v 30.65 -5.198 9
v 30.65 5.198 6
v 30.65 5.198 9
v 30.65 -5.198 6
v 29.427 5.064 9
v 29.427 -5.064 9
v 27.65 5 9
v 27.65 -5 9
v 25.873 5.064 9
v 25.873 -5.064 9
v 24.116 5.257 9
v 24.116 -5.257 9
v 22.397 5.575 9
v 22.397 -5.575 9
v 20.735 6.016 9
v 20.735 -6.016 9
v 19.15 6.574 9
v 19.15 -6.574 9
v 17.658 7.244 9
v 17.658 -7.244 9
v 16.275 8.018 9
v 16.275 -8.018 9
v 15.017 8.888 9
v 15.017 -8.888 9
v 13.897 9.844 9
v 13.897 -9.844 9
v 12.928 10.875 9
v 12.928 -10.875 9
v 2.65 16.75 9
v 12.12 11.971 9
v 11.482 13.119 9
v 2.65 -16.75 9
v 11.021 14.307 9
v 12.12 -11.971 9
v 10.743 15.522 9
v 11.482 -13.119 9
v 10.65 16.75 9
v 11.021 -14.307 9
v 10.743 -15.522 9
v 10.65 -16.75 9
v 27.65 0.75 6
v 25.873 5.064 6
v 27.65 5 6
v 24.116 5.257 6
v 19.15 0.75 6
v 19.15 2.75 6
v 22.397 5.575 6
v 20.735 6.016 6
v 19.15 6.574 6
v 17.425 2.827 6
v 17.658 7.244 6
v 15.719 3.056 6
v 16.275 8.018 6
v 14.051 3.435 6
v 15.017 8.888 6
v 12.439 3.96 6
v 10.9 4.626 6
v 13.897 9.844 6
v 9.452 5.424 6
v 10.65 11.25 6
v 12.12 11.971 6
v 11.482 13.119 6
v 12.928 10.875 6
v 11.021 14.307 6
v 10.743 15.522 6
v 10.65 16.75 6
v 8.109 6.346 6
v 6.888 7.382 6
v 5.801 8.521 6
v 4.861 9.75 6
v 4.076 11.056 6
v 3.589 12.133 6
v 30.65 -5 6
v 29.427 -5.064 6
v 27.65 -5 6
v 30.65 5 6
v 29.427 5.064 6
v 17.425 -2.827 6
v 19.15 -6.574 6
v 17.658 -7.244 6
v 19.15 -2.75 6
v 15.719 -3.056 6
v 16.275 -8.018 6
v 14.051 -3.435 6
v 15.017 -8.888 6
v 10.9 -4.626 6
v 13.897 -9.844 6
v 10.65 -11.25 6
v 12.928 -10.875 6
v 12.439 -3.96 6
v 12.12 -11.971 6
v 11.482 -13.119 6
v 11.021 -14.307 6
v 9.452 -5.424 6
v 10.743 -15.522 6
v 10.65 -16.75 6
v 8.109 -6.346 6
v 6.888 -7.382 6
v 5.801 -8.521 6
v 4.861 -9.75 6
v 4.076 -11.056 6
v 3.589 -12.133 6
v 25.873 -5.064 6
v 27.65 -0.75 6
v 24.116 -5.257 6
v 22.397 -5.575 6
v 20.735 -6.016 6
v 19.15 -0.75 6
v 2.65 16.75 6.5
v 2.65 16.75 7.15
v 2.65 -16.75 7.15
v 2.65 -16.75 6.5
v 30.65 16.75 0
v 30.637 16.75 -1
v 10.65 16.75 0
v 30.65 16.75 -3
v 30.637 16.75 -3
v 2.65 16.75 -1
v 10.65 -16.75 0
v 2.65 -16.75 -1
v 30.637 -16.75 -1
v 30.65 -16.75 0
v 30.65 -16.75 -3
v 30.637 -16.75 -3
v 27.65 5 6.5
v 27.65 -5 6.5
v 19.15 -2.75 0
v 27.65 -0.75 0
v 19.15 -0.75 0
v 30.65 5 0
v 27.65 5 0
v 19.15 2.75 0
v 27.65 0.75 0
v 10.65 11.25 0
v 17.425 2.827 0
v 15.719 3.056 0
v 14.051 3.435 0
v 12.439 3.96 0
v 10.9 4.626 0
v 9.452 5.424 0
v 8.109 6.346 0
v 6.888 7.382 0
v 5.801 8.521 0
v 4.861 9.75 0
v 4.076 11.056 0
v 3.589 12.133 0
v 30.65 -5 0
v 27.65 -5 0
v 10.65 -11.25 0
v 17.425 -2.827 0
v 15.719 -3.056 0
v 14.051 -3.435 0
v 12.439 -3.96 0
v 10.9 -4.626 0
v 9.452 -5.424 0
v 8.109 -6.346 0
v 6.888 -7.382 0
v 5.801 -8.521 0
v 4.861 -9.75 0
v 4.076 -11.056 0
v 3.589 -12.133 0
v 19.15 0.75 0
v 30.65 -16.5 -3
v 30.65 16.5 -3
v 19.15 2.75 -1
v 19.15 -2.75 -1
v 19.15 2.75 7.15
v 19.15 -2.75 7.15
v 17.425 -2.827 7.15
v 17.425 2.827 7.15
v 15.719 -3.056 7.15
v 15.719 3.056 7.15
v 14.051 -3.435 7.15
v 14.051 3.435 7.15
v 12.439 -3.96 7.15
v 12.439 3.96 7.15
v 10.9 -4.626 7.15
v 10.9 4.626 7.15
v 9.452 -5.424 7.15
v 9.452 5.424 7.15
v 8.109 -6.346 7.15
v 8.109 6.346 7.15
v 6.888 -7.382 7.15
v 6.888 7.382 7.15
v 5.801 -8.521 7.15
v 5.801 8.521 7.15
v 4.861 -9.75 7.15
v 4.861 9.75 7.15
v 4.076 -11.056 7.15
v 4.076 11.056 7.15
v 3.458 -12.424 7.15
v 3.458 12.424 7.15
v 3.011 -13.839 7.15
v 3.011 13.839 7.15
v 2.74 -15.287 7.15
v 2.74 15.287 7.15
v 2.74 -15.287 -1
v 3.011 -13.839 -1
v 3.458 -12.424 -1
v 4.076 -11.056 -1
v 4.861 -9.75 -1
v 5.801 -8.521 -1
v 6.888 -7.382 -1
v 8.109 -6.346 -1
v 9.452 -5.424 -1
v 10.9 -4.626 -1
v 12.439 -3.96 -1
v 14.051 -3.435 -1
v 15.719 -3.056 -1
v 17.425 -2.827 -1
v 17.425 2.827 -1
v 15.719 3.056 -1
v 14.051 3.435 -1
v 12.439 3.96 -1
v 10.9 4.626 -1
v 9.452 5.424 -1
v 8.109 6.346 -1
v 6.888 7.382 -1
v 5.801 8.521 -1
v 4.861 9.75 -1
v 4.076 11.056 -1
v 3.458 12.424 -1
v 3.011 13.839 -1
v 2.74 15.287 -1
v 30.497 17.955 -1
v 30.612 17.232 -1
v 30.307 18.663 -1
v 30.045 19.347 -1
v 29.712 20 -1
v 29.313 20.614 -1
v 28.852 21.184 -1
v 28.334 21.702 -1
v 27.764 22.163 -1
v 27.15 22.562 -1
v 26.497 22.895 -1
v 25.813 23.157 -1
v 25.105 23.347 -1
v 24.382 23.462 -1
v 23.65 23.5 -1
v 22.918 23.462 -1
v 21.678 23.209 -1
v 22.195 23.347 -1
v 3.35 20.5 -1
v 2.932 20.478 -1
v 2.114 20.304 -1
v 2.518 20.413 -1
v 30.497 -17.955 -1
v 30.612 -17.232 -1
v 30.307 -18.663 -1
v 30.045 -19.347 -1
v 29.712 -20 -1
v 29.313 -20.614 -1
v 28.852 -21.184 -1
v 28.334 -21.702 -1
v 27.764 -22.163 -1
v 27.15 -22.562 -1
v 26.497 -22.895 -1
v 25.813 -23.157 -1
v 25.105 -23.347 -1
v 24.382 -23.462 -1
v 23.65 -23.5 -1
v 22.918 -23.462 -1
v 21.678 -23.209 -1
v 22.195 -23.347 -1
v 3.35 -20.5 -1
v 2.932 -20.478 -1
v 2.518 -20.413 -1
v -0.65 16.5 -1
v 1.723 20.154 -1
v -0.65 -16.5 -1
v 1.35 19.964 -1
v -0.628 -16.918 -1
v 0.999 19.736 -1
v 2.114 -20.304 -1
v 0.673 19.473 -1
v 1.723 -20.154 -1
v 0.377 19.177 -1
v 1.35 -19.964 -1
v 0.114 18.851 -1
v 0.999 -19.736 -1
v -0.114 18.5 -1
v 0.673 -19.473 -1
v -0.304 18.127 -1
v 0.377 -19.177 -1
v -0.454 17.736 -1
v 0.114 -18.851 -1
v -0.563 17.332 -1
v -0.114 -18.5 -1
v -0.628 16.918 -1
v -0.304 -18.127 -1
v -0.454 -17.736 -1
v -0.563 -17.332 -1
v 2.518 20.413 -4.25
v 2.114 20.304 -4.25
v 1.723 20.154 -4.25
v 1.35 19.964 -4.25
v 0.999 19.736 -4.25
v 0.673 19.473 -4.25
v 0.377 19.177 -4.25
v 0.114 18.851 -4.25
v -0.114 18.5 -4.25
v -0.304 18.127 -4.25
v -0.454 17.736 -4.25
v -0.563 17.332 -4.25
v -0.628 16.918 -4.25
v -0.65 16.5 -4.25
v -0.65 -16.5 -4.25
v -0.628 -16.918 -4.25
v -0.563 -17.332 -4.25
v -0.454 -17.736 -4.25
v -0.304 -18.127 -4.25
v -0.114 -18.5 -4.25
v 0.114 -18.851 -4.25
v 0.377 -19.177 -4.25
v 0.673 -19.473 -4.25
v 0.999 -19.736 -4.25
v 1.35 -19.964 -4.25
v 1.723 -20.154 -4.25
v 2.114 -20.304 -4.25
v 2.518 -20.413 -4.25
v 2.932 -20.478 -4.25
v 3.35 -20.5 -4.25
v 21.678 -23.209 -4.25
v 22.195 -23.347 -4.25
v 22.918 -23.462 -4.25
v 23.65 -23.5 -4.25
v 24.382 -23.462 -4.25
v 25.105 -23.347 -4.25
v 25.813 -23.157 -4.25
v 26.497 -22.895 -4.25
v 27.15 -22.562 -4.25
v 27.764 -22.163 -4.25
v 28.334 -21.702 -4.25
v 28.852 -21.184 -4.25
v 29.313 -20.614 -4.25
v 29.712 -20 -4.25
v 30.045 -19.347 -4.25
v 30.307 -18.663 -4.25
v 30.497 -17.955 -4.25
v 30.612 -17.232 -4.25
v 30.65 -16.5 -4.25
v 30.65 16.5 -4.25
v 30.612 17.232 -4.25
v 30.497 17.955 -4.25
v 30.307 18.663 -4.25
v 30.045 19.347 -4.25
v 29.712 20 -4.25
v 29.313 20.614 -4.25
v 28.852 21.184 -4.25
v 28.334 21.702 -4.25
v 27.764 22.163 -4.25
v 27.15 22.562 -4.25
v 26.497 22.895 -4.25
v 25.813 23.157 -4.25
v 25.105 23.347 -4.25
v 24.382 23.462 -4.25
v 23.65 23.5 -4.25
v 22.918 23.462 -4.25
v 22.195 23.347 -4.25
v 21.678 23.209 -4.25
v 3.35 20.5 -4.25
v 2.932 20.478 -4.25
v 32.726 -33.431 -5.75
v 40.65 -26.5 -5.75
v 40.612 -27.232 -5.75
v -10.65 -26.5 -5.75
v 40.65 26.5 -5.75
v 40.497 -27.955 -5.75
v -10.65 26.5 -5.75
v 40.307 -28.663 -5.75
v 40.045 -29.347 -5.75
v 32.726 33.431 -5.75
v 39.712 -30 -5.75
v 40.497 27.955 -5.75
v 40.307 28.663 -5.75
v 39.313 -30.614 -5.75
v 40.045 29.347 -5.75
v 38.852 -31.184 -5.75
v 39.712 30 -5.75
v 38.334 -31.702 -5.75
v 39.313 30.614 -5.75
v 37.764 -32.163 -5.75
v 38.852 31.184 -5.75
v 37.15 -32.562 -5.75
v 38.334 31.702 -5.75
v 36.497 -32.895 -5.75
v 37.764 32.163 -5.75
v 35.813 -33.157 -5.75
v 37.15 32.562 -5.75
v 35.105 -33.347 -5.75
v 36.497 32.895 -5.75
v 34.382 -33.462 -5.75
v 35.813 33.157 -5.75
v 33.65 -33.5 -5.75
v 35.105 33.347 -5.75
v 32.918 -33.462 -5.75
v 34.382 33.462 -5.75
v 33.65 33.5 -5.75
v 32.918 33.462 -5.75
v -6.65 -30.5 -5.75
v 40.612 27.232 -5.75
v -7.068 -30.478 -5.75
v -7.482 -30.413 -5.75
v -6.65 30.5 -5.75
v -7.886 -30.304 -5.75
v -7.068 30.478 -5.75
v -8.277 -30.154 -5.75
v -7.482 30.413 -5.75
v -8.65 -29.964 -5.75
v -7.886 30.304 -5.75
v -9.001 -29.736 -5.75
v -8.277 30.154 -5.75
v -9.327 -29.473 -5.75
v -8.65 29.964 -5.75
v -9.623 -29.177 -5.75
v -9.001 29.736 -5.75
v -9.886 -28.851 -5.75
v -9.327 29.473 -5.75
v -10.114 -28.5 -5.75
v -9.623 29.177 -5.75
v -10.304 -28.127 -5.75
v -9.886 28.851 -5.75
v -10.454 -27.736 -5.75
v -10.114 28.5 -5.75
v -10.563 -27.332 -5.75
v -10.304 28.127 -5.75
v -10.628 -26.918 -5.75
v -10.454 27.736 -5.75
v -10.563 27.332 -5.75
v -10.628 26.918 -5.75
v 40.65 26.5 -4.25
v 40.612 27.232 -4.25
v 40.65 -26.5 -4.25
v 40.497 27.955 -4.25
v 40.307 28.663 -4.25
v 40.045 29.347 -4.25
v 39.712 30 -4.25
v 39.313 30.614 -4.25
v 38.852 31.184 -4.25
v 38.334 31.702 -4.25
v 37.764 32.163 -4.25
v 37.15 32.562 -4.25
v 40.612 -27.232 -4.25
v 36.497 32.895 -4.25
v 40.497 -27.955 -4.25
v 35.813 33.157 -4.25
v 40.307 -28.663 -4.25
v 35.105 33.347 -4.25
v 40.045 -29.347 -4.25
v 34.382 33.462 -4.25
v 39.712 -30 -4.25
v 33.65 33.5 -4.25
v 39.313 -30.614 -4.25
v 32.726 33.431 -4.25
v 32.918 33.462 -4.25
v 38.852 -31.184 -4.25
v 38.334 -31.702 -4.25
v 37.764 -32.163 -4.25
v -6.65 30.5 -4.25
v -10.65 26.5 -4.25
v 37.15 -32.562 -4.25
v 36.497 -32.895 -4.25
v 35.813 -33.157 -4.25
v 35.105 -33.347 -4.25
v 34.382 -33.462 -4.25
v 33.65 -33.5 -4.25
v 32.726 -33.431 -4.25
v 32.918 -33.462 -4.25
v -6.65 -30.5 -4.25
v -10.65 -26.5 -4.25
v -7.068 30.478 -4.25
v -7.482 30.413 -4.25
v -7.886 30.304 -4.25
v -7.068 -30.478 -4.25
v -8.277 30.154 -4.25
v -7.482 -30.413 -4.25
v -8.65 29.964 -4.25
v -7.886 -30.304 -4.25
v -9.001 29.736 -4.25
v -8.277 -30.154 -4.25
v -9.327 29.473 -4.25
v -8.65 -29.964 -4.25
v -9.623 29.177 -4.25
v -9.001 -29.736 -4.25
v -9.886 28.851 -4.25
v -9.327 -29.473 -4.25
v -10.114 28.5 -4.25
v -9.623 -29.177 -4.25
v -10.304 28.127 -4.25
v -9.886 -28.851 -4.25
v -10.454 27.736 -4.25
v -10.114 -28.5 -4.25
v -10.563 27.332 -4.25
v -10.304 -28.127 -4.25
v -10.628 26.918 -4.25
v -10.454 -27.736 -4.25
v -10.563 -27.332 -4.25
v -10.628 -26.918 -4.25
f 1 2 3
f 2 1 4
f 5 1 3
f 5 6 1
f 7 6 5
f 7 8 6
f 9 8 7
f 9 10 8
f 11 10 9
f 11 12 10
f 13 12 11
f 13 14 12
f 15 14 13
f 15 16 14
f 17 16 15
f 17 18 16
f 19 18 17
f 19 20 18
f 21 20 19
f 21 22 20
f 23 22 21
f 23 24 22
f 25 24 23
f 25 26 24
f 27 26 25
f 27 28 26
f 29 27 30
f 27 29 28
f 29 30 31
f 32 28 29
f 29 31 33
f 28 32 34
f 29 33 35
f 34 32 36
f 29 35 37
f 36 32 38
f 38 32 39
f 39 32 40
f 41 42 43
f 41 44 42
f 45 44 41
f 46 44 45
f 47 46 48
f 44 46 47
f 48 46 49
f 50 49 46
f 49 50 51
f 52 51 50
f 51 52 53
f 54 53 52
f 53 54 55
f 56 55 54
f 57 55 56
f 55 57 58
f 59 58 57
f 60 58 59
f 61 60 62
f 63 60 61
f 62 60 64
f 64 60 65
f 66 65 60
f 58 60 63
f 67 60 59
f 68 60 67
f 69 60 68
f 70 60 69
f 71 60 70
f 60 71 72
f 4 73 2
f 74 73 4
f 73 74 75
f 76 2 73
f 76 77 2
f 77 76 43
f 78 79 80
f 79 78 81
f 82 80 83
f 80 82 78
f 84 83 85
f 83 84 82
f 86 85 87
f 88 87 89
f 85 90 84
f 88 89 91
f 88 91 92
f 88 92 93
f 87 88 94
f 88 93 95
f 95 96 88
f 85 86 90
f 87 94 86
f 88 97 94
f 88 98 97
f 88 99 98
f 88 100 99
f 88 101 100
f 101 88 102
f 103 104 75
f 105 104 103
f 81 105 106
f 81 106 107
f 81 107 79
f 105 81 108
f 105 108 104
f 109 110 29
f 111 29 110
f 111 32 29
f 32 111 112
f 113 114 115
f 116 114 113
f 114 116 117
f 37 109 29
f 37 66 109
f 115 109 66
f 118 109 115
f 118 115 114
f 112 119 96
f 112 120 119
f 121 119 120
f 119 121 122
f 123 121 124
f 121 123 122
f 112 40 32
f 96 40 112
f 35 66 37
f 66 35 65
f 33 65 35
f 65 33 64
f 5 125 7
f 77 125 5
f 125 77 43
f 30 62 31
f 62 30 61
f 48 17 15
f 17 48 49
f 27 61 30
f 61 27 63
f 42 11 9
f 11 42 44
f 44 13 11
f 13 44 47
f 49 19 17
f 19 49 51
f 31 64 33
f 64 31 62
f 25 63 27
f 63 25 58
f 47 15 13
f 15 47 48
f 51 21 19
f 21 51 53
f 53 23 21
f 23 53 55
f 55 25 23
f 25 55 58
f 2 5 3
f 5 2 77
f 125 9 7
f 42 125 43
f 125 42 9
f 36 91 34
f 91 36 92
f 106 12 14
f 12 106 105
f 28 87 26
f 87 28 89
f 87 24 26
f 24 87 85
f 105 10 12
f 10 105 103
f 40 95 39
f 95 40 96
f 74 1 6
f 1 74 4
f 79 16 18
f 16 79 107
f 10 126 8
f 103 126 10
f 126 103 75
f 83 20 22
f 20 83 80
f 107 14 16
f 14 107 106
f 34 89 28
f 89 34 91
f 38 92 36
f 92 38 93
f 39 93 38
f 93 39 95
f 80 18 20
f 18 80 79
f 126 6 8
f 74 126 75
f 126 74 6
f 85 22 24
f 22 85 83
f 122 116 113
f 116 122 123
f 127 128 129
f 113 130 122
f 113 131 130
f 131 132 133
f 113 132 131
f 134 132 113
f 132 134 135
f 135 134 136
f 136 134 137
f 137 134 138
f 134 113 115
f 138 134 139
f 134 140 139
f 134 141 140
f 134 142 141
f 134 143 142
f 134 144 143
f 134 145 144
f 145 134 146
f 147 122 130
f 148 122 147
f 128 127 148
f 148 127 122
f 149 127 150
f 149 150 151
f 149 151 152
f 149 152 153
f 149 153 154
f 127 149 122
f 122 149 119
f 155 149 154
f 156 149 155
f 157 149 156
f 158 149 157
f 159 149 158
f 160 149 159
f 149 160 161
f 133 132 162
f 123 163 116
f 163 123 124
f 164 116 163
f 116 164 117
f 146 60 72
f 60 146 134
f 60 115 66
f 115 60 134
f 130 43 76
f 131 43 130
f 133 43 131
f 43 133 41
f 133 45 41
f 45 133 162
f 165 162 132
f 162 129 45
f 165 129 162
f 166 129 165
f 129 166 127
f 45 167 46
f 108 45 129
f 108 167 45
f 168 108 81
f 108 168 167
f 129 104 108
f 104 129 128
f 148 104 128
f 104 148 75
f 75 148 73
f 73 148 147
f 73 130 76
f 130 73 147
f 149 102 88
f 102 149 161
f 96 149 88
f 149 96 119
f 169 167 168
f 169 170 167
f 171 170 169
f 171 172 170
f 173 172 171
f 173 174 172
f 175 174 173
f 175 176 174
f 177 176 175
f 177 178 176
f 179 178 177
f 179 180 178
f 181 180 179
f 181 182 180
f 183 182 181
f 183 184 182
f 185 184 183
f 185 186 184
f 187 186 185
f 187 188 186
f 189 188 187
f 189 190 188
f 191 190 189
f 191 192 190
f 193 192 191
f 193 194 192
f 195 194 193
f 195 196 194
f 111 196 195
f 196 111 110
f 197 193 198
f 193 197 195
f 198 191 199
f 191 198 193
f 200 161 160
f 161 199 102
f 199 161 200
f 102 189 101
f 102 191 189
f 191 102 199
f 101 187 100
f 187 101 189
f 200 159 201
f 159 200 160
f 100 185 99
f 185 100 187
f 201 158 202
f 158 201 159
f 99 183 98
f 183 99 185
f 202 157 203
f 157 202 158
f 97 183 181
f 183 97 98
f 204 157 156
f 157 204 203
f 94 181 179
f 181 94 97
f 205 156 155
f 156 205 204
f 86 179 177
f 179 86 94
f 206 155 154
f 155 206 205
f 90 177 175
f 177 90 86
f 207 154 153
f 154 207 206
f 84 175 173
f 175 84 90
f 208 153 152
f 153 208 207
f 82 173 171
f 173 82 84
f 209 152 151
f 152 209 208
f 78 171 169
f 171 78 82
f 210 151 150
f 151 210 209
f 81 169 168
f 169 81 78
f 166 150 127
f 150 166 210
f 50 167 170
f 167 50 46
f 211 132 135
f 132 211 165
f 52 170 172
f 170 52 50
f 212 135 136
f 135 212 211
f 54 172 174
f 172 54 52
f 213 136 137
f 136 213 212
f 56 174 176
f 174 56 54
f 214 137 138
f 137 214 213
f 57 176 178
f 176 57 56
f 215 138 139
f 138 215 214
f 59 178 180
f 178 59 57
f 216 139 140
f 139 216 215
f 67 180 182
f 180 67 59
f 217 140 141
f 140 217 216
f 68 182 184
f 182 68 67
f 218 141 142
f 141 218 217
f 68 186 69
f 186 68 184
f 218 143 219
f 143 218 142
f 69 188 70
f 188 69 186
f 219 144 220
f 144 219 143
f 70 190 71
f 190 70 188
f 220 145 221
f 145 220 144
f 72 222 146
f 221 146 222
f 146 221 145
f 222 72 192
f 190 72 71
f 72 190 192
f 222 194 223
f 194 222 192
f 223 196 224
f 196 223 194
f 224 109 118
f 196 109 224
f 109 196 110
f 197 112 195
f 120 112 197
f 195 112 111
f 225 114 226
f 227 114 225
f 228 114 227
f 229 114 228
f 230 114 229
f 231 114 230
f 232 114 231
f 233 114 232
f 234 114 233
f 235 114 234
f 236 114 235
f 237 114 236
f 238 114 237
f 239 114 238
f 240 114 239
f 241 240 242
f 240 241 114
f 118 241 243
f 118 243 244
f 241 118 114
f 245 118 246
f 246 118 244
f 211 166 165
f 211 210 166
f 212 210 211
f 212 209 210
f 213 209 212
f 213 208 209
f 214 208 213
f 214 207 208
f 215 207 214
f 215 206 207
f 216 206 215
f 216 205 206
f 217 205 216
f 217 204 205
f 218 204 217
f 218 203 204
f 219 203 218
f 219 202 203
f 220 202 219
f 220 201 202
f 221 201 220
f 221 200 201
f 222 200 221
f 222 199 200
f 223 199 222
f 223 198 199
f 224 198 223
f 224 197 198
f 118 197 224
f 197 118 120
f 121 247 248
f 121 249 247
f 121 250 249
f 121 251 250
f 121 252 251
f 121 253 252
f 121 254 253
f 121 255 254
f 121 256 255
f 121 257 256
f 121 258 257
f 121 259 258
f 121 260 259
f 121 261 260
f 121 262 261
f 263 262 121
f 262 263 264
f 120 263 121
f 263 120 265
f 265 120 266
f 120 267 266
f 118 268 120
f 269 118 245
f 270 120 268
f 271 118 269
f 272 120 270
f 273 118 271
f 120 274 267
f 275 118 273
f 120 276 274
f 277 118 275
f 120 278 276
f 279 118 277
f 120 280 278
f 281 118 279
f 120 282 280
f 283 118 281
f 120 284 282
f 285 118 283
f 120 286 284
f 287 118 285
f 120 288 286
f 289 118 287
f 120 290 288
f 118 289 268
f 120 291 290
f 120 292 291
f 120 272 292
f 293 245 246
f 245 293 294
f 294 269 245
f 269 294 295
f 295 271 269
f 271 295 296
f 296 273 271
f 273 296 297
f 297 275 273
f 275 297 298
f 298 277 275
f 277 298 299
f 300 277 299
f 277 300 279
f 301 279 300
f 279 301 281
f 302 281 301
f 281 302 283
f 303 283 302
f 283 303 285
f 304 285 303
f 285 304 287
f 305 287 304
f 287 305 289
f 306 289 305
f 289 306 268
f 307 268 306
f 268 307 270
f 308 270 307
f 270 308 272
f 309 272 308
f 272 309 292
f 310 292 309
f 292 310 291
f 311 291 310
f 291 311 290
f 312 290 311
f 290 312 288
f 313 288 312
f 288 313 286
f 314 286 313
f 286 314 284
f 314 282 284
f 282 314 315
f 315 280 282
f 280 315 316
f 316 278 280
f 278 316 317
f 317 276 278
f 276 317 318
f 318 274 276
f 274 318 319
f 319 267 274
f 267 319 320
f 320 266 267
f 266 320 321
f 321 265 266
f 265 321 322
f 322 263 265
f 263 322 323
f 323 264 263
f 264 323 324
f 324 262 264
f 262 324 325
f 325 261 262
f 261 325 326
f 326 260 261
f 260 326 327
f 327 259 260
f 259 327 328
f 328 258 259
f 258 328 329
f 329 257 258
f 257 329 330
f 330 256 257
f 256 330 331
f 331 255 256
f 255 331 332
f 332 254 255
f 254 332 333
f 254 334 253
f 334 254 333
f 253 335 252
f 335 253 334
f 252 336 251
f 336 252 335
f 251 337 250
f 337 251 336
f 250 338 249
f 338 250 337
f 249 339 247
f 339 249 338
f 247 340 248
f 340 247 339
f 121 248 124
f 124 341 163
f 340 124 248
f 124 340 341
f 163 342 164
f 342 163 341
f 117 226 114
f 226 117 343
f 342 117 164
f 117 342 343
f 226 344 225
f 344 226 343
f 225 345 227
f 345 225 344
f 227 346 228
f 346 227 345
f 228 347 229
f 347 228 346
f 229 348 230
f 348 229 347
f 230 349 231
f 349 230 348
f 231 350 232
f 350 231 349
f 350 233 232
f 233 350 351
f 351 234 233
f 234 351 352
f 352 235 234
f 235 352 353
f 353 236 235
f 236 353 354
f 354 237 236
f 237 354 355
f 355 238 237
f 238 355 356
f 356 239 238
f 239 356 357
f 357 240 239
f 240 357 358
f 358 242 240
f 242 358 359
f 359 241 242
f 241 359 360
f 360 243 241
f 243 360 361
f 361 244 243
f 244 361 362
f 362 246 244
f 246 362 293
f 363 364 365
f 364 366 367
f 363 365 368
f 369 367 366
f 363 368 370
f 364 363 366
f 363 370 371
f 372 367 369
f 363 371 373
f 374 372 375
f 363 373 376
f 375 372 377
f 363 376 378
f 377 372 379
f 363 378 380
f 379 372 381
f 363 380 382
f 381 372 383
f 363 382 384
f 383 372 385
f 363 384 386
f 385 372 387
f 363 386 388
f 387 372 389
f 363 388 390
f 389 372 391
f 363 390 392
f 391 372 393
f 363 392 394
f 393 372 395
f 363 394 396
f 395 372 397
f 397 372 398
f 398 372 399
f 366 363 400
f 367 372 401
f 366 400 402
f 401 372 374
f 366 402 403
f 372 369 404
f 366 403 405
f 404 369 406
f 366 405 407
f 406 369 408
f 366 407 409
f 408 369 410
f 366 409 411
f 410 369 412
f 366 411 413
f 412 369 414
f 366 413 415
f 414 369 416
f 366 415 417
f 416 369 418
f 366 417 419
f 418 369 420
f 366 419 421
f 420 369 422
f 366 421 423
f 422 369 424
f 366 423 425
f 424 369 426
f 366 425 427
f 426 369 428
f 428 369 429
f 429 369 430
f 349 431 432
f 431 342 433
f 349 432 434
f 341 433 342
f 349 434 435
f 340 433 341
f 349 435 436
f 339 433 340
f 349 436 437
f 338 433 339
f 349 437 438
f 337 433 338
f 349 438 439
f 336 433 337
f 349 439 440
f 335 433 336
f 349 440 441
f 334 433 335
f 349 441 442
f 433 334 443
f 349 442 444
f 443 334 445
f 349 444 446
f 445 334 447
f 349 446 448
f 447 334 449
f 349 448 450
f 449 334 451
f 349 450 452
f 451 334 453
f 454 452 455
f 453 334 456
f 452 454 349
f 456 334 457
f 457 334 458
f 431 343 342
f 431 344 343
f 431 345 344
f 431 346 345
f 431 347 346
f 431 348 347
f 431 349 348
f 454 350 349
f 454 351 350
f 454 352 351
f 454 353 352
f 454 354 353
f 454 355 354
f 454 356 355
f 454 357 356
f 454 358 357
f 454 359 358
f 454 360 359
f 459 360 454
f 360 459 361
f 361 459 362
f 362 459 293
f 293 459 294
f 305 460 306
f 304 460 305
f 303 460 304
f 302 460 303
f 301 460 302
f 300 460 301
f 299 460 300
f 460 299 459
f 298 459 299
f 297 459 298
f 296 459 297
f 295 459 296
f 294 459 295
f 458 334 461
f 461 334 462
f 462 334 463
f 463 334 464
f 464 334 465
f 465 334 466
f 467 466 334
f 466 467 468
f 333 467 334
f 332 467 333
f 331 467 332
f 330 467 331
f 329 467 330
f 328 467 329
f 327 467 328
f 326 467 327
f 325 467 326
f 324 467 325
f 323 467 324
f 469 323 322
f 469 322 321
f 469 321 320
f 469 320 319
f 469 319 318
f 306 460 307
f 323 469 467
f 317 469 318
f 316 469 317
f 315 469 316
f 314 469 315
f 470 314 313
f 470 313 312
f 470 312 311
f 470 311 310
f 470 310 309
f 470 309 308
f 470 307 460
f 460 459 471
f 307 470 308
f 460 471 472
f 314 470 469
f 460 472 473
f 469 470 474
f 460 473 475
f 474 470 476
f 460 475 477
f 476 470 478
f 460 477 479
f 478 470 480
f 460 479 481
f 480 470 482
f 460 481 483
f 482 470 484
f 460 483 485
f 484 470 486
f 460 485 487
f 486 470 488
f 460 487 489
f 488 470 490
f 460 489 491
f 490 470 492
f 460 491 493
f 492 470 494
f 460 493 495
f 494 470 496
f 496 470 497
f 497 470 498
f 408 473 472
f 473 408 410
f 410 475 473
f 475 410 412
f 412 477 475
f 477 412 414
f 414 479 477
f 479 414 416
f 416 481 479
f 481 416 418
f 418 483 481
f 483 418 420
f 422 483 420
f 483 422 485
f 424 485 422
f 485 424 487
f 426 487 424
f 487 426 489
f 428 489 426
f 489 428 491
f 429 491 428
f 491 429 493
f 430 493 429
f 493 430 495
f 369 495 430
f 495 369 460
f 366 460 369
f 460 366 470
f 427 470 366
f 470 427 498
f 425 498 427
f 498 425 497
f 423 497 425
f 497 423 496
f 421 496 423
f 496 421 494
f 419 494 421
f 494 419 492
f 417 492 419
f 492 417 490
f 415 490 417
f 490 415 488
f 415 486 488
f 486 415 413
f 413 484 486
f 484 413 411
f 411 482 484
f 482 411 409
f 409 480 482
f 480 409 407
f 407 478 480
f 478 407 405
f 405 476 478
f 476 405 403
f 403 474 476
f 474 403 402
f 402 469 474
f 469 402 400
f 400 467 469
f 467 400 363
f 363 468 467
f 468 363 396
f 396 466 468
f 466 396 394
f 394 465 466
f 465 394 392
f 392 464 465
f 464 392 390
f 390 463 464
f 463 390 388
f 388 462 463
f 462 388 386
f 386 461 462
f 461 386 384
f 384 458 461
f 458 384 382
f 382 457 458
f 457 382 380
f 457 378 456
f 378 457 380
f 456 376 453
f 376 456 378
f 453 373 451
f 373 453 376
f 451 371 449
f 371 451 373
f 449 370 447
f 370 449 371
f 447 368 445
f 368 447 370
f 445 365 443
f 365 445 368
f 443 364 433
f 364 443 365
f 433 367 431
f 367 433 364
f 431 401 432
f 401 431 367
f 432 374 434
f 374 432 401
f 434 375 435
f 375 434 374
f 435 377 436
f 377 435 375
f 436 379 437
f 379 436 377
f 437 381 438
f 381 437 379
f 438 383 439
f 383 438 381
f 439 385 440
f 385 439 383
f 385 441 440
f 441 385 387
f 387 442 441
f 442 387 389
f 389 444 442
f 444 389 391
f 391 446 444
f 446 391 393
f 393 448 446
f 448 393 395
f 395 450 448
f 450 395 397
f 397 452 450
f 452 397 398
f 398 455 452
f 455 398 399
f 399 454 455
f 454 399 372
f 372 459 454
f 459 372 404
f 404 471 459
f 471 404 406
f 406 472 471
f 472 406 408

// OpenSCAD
a=33.0;
b=31.3;
R=4;
r=7;
h=1.5;


//translate([-40,0,0])

module notch(h_, a_, b_, R_, r_) {
    linear_extrude(height = h_) {
        translate([-b_/2+R_,a_/2])
            circle(R_, $fn = 60);

        translate([-b_/2+R_,-a_/2])
            circle(R_, $fn = 60);

        translate([+b_/2-r_,a_/2])
            circle(r_, $fn = 60);

        translate([+b_/2-r_,-a_/2])
            circle(r_, $fn = 60);

        scale([b_, a_])
            square ([1,1],center = true);

        polygon( points=[[-b_/2+R_,a_/2+R_],[-b_/2+R_,-a_/2-R_],[b_/2-r_,-a_/2-r_],[b_/2-r_,a_/2+r_]] );
    }
}

//translate([-40,0,0]) {
//    notch(4, a, b, R, r);
//
//    translate([0,0,-h/2])
//        notch(h, a+20, b+20, R, r);
//}

l1=2.65;
l2=25;
l3=8.5;
w1=33.5;
w2=5.5;

h1=6.0;
h2=8.3;
hooks_length=8;
hooks_width1=4.5;
hooks_width2=5.5;
nose_width=1.5;
fence_width=10;
fence_strength=3;

base_top_strength=3;



module sledge() {
    translate([0,0,-0.5])
    linear_extrude(height = h1+1) {
        
        polygon( points=[[l1,w1/2],
                         [l1+hooks_length,w1/2],
                         [l1+hooks_length,w1/2-hooks_width2],
                         [l1,w1/2-hooks_width1]] );

        polygon( points=[[l1,-w1/2],
                         [l1+hooks_length,-w1/2],
                         [l1+hooks_length,-w1/2+hooks_width2],
                         [l1,-w1/2+hooks_width1]] );

        translate([l1+l2-l3/2, 0])
            square([l3, nose_width], center=true);

        translate([l1+l2+fence_strength/2, 0])
            square([fence_strength, fence_width], center=true);
    }
}

//sledge();

module free_space() {
    linear_extrude(height = h2) {
        difference() {
            translate([(l1+l2-l3)/2,0])
                scale([l1+l2-l3, w1])
                    square ([1,1],center = true);

            translate([l1+l2-l3, w1/2])
                scale([l2-l3, (w1-w2)/2])
                    circle(1, $fn = 60);

            translate([l1+l2-l3, -w1/2])
                scale([l2-l3, (w1-w2)/2])
                    circle(1, $fn = 60);
        }
    }
}


module catcher() {
    difference() {
        union() {
            translate([0,-w1/2, -base_top_strength])
                cube([l1+l2+fence_strength, w1,base_top_strength]);

            difference() {
                translate([l1,-w1/2, h1])
                    cube([l2+fence_strength, w1,base_top_strength]);

                translate([l1+l2, w1/2])
                    linear_extrude(height = 20)
                        scale([l2-hooks_length,(w1-fence_width)/2])
                            circle(1, $fn = 60);

                translate([l1+l2, -w1/2])
                    linear_extrude(height = 20)
                        scale([l2-hooks_length,(w1-fence_width)/2])
                            circle(1, $fn = 60);
            }

            sledge();
        }

        translate([0,0,-(h2-h1)/2])
            free_space();  
    }
}


catcher();

translate([15,0,-5]) {
    notch(4, a, b, R, r);

    translate([0,0,-h/2])
        notch(h, a+20, b+20, R, r);
}
